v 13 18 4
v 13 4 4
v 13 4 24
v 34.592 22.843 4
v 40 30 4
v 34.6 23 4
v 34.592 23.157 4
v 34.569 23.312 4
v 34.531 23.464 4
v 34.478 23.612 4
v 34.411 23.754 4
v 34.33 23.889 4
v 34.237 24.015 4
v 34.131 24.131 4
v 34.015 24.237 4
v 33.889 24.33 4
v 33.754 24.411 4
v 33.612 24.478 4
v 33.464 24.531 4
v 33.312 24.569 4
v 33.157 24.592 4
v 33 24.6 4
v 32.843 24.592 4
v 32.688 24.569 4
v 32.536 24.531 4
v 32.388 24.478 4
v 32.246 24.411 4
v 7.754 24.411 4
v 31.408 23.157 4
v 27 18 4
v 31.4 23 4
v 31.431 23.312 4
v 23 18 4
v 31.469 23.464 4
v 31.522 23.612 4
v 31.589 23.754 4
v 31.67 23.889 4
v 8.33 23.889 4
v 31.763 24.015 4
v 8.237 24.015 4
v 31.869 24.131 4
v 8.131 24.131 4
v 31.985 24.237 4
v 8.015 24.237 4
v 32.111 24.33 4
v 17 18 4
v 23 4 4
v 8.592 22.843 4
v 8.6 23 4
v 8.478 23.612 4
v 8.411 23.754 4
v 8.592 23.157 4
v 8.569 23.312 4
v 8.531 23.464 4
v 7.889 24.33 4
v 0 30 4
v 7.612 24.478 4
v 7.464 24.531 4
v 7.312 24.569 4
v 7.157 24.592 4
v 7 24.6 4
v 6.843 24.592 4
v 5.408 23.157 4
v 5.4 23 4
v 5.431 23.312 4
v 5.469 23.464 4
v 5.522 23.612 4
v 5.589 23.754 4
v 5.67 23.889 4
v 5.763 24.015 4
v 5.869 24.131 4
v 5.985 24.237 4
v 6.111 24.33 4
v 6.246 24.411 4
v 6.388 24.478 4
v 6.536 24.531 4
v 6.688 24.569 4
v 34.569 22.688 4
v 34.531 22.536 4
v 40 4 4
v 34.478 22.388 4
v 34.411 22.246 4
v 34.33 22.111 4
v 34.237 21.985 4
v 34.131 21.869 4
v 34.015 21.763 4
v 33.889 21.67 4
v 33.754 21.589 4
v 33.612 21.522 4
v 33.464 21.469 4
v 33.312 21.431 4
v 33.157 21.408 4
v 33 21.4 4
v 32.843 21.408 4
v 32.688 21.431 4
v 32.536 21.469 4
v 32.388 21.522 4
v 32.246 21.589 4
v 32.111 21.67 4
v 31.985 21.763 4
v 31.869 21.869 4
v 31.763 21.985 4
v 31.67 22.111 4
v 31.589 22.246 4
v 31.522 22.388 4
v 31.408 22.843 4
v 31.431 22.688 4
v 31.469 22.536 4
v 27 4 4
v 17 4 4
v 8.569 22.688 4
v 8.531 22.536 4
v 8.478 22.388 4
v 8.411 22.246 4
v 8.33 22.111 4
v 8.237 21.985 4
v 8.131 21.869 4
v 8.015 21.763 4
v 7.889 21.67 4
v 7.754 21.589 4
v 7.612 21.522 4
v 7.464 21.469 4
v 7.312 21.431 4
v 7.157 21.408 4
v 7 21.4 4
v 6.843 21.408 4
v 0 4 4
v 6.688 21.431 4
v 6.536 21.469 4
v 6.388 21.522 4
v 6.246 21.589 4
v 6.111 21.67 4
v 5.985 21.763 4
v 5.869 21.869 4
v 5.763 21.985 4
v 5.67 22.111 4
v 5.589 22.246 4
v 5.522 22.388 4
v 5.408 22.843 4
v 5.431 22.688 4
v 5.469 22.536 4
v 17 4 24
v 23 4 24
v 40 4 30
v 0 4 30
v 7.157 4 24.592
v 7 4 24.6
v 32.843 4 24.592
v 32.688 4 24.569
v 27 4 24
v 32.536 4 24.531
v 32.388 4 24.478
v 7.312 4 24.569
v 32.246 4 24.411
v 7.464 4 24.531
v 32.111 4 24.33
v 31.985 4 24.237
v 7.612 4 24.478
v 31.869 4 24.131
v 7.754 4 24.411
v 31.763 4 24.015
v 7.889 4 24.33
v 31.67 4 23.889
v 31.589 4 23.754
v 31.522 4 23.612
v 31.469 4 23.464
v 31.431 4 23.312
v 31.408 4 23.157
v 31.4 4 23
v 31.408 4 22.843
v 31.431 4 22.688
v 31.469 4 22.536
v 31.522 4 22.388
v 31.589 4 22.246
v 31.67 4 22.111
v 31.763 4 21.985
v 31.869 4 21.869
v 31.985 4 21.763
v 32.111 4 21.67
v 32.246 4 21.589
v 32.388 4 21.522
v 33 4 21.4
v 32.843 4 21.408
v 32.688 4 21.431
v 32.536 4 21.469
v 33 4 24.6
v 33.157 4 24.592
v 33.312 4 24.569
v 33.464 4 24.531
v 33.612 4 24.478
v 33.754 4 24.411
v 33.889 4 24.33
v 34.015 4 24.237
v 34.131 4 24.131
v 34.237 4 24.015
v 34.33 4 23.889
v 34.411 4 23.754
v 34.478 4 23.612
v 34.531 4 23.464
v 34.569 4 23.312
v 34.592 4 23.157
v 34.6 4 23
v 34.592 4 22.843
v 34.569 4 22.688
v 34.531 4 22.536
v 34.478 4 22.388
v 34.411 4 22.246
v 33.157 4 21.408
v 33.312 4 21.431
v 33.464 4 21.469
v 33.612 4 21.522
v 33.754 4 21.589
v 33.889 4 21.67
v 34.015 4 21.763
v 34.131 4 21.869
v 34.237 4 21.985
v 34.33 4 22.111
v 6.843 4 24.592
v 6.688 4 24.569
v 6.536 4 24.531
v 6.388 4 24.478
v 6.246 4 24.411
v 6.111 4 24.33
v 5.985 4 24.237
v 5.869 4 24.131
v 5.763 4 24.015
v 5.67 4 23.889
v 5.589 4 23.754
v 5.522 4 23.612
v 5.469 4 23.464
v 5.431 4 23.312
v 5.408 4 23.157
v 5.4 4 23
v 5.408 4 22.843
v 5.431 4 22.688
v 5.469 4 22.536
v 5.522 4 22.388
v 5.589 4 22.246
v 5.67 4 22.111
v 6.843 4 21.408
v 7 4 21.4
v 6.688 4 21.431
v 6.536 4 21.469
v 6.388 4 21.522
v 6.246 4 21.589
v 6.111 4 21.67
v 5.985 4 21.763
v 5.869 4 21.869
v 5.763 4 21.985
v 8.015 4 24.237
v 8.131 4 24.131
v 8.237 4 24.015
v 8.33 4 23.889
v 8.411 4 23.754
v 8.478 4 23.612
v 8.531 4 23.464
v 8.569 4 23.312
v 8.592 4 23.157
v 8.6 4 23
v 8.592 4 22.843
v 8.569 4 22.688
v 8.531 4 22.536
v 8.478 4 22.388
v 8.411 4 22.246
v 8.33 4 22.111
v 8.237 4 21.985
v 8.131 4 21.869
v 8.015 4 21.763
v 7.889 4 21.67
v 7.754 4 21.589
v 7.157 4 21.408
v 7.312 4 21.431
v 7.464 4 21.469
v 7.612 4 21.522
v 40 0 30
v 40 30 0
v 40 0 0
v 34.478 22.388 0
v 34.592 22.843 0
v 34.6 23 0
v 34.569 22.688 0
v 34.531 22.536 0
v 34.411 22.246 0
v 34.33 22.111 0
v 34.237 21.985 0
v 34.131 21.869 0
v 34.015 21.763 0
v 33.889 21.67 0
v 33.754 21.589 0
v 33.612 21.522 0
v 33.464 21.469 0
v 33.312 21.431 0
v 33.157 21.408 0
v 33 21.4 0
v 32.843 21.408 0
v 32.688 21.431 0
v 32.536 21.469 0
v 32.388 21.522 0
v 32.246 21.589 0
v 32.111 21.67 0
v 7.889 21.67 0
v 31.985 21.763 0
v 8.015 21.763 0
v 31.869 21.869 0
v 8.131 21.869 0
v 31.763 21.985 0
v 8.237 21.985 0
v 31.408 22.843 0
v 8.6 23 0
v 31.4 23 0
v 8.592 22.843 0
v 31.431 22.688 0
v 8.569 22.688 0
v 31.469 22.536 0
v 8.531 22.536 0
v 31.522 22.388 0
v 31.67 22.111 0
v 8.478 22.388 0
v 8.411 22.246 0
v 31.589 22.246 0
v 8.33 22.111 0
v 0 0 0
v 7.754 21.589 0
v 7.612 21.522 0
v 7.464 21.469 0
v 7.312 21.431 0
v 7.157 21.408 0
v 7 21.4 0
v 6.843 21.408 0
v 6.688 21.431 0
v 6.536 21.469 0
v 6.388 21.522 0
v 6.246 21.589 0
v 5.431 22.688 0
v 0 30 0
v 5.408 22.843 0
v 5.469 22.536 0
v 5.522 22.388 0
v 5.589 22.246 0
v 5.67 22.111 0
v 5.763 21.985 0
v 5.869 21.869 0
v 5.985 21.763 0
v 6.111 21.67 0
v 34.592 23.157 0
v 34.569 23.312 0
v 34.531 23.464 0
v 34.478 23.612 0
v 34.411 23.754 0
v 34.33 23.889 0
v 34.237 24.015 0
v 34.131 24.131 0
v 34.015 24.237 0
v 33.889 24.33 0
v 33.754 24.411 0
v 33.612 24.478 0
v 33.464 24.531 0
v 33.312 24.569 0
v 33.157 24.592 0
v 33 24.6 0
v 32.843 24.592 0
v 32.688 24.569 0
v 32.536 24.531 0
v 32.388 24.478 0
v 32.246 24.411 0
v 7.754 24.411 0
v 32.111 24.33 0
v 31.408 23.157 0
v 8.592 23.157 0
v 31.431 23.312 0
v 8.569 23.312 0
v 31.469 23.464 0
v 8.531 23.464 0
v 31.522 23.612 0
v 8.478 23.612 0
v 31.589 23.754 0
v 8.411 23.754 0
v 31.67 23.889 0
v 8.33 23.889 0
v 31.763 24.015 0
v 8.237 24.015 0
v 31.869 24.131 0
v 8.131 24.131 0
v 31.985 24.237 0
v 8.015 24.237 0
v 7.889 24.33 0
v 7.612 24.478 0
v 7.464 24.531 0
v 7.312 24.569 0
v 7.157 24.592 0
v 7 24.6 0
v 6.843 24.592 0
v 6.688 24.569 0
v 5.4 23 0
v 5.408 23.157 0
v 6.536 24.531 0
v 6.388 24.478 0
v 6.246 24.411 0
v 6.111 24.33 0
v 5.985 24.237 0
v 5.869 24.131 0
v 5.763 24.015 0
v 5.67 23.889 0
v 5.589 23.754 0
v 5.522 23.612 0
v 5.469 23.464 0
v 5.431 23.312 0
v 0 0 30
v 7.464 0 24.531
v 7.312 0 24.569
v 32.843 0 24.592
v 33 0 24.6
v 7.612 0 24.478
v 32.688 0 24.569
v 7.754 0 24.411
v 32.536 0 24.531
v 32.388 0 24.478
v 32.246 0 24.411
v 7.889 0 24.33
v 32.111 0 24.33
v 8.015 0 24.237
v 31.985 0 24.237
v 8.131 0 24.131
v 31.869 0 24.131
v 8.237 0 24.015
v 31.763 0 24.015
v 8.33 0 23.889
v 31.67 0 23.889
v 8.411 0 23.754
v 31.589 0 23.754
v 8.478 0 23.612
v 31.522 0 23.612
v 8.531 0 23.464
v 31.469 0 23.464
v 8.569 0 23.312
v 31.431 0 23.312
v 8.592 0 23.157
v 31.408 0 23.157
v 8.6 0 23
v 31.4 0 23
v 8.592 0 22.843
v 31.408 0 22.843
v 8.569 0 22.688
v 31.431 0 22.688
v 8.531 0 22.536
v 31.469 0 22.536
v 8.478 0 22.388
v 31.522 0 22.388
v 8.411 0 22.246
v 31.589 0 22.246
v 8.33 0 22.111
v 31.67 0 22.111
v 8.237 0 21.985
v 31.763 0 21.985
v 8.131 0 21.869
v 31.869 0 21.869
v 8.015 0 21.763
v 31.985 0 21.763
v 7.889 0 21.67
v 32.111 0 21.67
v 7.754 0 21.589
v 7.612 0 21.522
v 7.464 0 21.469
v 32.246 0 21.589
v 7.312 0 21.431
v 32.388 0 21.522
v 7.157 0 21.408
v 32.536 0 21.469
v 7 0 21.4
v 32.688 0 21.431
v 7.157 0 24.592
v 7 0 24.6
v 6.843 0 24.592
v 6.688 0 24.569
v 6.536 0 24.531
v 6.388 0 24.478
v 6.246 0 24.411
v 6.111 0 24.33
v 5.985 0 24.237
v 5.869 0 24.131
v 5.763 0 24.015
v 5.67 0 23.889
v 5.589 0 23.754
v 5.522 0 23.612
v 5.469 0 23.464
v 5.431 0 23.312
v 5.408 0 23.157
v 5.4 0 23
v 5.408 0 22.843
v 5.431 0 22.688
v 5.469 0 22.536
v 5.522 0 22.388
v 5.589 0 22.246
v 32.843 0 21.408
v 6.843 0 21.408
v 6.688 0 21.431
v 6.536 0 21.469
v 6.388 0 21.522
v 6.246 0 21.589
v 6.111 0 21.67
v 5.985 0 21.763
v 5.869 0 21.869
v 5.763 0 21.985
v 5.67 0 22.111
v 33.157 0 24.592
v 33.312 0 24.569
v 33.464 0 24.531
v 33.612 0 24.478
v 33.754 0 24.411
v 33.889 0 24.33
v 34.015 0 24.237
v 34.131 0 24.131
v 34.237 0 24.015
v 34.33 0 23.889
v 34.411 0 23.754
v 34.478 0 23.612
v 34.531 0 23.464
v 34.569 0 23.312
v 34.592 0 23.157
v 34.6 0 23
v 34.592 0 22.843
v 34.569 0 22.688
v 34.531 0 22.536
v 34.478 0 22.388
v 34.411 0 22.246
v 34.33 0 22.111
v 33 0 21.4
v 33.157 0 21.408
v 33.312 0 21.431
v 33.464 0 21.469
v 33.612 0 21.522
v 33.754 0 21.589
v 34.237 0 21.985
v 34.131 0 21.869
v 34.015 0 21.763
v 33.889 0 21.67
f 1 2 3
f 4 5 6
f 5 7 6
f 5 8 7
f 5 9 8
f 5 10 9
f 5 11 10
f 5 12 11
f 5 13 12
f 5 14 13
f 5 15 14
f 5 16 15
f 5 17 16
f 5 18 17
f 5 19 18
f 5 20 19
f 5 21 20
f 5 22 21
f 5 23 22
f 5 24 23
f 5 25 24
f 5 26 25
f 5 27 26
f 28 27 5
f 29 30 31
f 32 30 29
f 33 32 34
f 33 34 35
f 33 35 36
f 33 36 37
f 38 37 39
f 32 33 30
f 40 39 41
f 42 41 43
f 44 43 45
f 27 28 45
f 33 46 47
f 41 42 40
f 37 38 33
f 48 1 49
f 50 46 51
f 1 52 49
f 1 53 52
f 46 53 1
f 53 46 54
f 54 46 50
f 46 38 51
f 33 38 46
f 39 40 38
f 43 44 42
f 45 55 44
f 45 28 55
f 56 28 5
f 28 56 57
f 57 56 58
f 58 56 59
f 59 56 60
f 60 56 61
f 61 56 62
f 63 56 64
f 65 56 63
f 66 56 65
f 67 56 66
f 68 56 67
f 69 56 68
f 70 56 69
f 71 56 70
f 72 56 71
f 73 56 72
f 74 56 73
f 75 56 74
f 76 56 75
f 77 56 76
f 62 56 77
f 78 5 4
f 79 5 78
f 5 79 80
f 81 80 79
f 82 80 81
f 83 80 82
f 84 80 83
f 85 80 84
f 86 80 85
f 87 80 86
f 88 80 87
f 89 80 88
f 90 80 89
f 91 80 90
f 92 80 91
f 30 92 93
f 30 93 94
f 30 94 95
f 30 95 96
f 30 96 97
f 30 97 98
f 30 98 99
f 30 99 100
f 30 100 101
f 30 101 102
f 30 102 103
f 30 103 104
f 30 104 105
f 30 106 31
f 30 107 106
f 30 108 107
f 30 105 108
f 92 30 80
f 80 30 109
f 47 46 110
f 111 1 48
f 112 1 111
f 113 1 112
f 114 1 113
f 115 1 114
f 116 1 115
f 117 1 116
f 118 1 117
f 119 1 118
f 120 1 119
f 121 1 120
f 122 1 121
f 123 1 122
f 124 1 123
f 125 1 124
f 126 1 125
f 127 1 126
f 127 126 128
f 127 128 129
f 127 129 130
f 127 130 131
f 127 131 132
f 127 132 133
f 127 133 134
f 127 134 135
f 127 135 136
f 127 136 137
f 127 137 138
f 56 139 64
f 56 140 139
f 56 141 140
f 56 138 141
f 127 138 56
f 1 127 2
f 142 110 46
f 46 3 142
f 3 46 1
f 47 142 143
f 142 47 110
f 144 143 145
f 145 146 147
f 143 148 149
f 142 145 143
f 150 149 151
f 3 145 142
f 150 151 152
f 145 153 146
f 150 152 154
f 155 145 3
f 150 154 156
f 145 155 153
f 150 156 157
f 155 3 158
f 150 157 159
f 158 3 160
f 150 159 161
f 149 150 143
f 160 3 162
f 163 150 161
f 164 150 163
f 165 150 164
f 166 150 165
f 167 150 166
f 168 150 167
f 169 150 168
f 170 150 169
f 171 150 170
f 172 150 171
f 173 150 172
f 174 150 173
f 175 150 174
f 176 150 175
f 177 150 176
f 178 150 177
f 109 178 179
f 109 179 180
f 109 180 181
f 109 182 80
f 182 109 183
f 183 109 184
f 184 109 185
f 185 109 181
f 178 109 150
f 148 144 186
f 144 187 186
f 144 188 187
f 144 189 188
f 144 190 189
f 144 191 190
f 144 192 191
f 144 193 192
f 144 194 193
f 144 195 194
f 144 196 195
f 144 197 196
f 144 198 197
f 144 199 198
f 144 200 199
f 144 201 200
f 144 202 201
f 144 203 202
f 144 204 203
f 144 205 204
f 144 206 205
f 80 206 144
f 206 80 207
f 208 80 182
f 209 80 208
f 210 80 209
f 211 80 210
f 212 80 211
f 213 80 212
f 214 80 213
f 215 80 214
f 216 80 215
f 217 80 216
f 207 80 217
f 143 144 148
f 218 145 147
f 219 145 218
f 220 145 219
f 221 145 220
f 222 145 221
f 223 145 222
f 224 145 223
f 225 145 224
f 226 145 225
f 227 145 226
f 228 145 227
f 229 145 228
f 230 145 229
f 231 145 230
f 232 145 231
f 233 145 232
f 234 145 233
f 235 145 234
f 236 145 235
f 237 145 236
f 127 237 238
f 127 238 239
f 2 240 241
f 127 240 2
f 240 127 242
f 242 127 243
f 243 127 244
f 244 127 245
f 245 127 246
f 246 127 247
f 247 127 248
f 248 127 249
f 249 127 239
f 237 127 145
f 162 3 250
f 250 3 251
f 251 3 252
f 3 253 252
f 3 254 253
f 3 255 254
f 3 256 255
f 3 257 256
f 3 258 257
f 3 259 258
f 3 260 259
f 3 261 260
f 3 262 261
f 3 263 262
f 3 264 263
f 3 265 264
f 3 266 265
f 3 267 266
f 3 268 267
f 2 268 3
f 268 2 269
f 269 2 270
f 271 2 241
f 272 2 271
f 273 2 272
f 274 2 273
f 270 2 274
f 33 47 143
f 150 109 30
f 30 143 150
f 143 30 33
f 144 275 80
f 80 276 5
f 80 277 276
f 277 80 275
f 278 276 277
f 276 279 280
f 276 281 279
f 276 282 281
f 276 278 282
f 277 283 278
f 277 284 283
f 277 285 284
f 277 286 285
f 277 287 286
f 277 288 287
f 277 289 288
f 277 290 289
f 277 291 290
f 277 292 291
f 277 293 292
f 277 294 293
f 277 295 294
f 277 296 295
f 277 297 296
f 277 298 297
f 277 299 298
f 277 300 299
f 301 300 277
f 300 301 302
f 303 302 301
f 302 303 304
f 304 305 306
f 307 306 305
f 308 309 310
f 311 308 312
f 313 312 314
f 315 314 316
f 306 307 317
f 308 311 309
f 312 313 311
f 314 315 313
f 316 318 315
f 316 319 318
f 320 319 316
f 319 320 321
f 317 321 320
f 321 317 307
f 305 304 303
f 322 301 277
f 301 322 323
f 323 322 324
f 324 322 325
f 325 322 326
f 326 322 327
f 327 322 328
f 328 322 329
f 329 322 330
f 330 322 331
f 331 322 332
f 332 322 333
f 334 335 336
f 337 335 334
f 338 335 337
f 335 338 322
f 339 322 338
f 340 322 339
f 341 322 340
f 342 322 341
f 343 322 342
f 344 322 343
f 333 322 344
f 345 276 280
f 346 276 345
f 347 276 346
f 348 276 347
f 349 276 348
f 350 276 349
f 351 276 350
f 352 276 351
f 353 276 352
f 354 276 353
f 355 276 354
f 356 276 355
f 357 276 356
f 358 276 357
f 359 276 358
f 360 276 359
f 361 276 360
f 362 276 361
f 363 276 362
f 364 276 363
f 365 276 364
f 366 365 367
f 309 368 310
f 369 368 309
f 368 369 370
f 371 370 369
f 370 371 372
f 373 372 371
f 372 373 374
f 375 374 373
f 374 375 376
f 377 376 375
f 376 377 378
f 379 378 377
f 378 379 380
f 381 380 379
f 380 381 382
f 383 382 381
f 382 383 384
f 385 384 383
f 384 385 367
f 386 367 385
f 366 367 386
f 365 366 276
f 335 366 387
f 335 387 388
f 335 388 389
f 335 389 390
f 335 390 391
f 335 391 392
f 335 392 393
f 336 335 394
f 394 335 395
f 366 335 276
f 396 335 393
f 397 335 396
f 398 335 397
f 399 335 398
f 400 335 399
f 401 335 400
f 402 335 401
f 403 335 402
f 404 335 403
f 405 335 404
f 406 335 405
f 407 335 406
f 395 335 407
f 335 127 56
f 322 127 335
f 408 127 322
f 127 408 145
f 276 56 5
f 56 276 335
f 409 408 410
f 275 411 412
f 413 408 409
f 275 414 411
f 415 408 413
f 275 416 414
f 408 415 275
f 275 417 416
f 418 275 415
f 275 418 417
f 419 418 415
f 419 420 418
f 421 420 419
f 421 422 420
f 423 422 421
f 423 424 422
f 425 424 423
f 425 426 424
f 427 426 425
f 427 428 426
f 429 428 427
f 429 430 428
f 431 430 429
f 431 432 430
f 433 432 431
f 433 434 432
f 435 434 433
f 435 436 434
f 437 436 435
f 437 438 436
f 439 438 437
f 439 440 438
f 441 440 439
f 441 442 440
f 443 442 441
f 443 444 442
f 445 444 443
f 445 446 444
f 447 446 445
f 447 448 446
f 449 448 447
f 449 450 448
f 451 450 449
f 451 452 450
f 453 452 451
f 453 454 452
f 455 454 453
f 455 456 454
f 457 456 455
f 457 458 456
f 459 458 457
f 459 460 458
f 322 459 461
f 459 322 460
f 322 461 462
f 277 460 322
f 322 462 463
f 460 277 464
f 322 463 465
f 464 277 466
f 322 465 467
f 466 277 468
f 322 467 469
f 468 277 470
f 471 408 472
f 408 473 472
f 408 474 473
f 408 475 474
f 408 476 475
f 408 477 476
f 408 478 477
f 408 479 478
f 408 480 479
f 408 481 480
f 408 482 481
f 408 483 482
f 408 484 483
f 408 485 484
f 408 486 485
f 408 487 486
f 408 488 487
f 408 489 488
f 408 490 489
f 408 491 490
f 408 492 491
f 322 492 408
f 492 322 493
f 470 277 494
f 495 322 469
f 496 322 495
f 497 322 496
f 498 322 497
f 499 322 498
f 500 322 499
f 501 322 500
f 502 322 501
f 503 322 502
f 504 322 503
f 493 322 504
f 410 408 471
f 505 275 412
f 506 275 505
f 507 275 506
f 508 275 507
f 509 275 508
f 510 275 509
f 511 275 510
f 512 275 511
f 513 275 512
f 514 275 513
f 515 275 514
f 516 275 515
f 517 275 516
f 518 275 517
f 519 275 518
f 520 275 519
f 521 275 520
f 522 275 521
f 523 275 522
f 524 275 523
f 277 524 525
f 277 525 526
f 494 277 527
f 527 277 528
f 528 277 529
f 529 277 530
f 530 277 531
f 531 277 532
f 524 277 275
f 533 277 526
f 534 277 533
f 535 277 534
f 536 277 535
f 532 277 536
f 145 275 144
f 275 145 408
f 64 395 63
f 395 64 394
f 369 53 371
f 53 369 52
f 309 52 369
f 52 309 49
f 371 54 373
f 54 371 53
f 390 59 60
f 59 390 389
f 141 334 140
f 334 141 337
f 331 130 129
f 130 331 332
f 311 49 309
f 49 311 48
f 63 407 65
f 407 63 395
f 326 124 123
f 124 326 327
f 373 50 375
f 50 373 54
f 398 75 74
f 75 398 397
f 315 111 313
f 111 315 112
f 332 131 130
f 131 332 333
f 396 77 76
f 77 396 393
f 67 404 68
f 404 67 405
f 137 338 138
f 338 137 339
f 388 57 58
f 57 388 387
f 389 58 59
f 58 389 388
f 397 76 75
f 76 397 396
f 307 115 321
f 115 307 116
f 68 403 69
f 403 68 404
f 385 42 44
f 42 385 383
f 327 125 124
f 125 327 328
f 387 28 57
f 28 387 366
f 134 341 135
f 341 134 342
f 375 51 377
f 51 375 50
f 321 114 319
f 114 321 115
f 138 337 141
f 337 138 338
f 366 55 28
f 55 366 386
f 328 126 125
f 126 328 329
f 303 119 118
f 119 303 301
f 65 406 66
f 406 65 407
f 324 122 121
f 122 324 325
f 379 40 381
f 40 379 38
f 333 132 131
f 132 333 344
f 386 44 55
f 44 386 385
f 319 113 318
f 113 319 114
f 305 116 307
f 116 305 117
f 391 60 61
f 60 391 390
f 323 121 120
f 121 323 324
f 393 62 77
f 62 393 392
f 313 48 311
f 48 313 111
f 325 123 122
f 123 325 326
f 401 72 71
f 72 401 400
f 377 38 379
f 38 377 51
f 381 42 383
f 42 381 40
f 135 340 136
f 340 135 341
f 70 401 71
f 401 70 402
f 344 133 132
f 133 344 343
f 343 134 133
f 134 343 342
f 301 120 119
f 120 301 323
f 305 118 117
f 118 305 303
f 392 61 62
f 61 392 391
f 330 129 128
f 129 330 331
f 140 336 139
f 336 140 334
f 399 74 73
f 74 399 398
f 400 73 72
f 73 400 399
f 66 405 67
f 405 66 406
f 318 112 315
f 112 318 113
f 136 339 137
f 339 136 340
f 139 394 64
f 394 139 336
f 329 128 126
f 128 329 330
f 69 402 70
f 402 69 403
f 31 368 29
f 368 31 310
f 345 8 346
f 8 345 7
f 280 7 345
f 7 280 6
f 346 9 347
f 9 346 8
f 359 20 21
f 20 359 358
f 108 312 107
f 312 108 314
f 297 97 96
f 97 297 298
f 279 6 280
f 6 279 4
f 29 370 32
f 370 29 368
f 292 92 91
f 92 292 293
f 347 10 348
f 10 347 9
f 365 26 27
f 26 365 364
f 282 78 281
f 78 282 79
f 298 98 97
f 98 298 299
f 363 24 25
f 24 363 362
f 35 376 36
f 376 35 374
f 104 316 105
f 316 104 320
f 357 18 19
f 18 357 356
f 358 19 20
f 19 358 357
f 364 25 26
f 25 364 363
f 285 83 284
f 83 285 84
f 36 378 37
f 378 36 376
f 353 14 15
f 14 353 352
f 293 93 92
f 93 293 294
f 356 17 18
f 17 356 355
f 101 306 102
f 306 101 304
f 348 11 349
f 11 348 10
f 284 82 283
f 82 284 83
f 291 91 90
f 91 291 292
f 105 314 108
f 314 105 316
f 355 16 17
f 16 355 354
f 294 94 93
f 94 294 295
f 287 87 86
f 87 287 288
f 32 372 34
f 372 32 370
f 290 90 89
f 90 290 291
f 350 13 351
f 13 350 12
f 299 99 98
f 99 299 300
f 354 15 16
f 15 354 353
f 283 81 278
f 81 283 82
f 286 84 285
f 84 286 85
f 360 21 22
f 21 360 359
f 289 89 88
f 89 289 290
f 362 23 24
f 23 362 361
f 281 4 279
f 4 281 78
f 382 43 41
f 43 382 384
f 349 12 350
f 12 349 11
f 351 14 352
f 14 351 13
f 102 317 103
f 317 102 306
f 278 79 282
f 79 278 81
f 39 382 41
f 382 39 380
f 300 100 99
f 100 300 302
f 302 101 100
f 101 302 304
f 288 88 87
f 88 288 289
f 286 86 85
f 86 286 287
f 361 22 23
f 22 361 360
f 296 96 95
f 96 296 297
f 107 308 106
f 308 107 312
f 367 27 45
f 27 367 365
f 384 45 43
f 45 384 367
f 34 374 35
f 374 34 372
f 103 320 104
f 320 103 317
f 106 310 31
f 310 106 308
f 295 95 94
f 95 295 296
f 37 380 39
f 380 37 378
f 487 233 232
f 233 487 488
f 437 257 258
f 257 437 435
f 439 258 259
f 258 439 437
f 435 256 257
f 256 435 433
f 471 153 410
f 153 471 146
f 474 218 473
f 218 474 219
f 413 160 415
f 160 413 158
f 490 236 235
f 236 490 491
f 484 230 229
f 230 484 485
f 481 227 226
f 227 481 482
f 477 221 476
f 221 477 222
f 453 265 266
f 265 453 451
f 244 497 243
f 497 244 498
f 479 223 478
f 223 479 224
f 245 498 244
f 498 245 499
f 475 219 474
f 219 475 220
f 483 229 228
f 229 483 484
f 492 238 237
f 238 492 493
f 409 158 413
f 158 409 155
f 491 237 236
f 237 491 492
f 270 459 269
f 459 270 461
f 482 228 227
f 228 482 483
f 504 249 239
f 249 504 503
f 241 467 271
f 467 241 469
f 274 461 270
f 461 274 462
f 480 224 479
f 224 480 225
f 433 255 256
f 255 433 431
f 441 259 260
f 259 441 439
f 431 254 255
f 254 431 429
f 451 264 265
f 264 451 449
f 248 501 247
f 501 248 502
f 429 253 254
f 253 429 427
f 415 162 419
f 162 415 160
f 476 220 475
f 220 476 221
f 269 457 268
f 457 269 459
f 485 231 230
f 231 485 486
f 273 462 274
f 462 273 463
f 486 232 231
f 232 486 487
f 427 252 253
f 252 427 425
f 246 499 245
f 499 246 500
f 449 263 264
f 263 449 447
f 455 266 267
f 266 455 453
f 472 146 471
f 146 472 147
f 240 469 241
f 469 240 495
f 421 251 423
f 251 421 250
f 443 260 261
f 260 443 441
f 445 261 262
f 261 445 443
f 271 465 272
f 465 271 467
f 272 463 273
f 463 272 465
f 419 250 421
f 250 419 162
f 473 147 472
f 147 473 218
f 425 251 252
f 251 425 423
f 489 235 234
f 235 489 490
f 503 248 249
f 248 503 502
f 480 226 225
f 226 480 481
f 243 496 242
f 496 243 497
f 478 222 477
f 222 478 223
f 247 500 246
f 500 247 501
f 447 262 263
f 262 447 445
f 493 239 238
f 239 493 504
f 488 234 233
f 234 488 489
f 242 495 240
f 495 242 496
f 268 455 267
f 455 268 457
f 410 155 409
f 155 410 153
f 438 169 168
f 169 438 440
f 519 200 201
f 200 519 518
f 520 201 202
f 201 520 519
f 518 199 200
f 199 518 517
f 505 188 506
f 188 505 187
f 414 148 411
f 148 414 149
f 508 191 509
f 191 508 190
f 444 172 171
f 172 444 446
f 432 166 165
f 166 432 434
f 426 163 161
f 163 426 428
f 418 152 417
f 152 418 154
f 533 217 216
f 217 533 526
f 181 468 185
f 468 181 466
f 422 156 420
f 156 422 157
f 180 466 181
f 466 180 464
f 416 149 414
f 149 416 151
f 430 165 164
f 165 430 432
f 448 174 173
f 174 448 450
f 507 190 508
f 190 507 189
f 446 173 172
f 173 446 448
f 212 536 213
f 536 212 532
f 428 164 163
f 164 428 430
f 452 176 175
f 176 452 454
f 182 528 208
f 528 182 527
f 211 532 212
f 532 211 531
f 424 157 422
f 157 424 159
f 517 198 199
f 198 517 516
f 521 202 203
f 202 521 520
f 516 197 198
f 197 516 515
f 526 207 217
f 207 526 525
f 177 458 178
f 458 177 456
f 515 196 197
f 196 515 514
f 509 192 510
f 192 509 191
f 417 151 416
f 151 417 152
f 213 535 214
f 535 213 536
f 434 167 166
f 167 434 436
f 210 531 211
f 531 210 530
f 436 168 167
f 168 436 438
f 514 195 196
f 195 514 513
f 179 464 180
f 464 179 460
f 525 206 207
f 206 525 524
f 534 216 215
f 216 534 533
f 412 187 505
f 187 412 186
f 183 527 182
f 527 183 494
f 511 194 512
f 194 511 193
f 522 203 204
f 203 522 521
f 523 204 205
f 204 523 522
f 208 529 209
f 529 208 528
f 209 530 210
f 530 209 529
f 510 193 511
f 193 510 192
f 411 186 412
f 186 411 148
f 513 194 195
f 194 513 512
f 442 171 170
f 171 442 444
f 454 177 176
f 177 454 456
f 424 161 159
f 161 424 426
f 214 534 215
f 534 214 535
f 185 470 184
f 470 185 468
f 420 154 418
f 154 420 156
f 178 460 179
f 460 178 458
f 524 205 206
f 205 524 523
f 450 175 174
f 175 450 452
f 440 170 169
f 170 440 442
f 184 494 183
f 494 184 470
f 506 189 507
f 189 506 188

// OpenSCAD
// =====================================================================
// test_bracket.scad - 動作確認用サンプル (Fusion360 編集向けクリーン版)
// L字ブラケット + M3 取付穴。基本形状(cube/cylinder)とブーリアンのみで構成し、
// STEP に変換したとき真の平面・円柱面になる = Fusion360 で選択・編集しやすい。
// 角丸/フィレットはあえて入れない -> 必要なら Fusion 側で追加する。
// F5 プレビュー / F6 レンダリング / STL 書き出し。
// =====================================================================

/* [基本寸法] */
plate_w  = 40;   // 底板の幅 (X)
plate_d  = 30;   // 底板の奥行 (Y)
wall_h   = 30;   // 立ち上がり壁の高さ (Z)
thick    = 4;    // 板厚

/* [取付穴] */
screw_d  = 3.2;  // M3 クリアランス穴 (公称3.0 + 0.2)
hole_inset = 7;  // 端からの穴中心距離 (X)

/* [補強リブ] */
gusset_run  = 14;  // リブが底板を這う長さ (Y)
gusset_rise = 20;  // リブが壁を這う高さ (Z)

/* [干渉チェック] */
clearance = 1.0;   // 穴とリブの間に最低限空ける隙間 (mm)

$fn = 64;          // 穴の分割数 (FreeCAD は cylinder を真円柱として復元)

// --- 位置(パラメータから導出) ------------------------------------------
hole_x   = [hole_inset, plate_w - hole_inset];   // 取付穴の X 位置 (底板・壁 共通)
gusset_x = [plate_w * 0.5 - 5, plate_w * 0.5 + 5]; // リブの X 中心 (中央寄り=穴を避ける)

// --- 干渉チェック: 壁穴とリブが X で重なっていないか ---------------------
// リブ半幅 + 穴半径 + clearance より近い穴があればビルドを止める。
min_dx = thick/2 + screw_d/2 + clearance;
for (hx = hole_x) for (gx = gusset_x)
    assert(abs(hx - gx) >= min_dx,
           str("干渉: 壁の取付穴 x=", hx, " と補強リブ x=", gx,
               " が近すぎます (必要間隔 ", min_dx, "mm)。",
               "hole_inset か gusset_x を調整してください。"));

// --- 部品 --------------------------------------------------------------
module gusset(cx) {
    // YZ 平面の直角三角形を X 方向へ thick 押し出し、内側コーナーへ
    translate([cx - thick/2, thick, thick])
        rotate([90, 0, 90])
            linear_extrude(height = thick)
                polygon([[0, 0], [gusset_run, 0], [0, gusset_rise]]);
}

difference() {
    union() {
        cube([plate_w, plate_d, thick]);          // 底板 (水平)
        cube([plate_w, thick, wall_h]);           // 立ち上がり壁 (Y=0 側)
        for (gx = gusset_x) gusset(gx);           // 補強リブ
    }

    // 底板の取付穴 (奥側)
    for (x = hole_x)
        translate([x, plate_d - hole_inset, -0.5])
            cylinder(d = screw_d, h = thick + 1);

    // 壁面の取付穴
    for (x = hole_x)
        translate([x, thick + 0.5, wall_h - hole_inset])
            rotate([90, 0, 0]) cylinder(d = screw_d, h = thick + 1);
}
